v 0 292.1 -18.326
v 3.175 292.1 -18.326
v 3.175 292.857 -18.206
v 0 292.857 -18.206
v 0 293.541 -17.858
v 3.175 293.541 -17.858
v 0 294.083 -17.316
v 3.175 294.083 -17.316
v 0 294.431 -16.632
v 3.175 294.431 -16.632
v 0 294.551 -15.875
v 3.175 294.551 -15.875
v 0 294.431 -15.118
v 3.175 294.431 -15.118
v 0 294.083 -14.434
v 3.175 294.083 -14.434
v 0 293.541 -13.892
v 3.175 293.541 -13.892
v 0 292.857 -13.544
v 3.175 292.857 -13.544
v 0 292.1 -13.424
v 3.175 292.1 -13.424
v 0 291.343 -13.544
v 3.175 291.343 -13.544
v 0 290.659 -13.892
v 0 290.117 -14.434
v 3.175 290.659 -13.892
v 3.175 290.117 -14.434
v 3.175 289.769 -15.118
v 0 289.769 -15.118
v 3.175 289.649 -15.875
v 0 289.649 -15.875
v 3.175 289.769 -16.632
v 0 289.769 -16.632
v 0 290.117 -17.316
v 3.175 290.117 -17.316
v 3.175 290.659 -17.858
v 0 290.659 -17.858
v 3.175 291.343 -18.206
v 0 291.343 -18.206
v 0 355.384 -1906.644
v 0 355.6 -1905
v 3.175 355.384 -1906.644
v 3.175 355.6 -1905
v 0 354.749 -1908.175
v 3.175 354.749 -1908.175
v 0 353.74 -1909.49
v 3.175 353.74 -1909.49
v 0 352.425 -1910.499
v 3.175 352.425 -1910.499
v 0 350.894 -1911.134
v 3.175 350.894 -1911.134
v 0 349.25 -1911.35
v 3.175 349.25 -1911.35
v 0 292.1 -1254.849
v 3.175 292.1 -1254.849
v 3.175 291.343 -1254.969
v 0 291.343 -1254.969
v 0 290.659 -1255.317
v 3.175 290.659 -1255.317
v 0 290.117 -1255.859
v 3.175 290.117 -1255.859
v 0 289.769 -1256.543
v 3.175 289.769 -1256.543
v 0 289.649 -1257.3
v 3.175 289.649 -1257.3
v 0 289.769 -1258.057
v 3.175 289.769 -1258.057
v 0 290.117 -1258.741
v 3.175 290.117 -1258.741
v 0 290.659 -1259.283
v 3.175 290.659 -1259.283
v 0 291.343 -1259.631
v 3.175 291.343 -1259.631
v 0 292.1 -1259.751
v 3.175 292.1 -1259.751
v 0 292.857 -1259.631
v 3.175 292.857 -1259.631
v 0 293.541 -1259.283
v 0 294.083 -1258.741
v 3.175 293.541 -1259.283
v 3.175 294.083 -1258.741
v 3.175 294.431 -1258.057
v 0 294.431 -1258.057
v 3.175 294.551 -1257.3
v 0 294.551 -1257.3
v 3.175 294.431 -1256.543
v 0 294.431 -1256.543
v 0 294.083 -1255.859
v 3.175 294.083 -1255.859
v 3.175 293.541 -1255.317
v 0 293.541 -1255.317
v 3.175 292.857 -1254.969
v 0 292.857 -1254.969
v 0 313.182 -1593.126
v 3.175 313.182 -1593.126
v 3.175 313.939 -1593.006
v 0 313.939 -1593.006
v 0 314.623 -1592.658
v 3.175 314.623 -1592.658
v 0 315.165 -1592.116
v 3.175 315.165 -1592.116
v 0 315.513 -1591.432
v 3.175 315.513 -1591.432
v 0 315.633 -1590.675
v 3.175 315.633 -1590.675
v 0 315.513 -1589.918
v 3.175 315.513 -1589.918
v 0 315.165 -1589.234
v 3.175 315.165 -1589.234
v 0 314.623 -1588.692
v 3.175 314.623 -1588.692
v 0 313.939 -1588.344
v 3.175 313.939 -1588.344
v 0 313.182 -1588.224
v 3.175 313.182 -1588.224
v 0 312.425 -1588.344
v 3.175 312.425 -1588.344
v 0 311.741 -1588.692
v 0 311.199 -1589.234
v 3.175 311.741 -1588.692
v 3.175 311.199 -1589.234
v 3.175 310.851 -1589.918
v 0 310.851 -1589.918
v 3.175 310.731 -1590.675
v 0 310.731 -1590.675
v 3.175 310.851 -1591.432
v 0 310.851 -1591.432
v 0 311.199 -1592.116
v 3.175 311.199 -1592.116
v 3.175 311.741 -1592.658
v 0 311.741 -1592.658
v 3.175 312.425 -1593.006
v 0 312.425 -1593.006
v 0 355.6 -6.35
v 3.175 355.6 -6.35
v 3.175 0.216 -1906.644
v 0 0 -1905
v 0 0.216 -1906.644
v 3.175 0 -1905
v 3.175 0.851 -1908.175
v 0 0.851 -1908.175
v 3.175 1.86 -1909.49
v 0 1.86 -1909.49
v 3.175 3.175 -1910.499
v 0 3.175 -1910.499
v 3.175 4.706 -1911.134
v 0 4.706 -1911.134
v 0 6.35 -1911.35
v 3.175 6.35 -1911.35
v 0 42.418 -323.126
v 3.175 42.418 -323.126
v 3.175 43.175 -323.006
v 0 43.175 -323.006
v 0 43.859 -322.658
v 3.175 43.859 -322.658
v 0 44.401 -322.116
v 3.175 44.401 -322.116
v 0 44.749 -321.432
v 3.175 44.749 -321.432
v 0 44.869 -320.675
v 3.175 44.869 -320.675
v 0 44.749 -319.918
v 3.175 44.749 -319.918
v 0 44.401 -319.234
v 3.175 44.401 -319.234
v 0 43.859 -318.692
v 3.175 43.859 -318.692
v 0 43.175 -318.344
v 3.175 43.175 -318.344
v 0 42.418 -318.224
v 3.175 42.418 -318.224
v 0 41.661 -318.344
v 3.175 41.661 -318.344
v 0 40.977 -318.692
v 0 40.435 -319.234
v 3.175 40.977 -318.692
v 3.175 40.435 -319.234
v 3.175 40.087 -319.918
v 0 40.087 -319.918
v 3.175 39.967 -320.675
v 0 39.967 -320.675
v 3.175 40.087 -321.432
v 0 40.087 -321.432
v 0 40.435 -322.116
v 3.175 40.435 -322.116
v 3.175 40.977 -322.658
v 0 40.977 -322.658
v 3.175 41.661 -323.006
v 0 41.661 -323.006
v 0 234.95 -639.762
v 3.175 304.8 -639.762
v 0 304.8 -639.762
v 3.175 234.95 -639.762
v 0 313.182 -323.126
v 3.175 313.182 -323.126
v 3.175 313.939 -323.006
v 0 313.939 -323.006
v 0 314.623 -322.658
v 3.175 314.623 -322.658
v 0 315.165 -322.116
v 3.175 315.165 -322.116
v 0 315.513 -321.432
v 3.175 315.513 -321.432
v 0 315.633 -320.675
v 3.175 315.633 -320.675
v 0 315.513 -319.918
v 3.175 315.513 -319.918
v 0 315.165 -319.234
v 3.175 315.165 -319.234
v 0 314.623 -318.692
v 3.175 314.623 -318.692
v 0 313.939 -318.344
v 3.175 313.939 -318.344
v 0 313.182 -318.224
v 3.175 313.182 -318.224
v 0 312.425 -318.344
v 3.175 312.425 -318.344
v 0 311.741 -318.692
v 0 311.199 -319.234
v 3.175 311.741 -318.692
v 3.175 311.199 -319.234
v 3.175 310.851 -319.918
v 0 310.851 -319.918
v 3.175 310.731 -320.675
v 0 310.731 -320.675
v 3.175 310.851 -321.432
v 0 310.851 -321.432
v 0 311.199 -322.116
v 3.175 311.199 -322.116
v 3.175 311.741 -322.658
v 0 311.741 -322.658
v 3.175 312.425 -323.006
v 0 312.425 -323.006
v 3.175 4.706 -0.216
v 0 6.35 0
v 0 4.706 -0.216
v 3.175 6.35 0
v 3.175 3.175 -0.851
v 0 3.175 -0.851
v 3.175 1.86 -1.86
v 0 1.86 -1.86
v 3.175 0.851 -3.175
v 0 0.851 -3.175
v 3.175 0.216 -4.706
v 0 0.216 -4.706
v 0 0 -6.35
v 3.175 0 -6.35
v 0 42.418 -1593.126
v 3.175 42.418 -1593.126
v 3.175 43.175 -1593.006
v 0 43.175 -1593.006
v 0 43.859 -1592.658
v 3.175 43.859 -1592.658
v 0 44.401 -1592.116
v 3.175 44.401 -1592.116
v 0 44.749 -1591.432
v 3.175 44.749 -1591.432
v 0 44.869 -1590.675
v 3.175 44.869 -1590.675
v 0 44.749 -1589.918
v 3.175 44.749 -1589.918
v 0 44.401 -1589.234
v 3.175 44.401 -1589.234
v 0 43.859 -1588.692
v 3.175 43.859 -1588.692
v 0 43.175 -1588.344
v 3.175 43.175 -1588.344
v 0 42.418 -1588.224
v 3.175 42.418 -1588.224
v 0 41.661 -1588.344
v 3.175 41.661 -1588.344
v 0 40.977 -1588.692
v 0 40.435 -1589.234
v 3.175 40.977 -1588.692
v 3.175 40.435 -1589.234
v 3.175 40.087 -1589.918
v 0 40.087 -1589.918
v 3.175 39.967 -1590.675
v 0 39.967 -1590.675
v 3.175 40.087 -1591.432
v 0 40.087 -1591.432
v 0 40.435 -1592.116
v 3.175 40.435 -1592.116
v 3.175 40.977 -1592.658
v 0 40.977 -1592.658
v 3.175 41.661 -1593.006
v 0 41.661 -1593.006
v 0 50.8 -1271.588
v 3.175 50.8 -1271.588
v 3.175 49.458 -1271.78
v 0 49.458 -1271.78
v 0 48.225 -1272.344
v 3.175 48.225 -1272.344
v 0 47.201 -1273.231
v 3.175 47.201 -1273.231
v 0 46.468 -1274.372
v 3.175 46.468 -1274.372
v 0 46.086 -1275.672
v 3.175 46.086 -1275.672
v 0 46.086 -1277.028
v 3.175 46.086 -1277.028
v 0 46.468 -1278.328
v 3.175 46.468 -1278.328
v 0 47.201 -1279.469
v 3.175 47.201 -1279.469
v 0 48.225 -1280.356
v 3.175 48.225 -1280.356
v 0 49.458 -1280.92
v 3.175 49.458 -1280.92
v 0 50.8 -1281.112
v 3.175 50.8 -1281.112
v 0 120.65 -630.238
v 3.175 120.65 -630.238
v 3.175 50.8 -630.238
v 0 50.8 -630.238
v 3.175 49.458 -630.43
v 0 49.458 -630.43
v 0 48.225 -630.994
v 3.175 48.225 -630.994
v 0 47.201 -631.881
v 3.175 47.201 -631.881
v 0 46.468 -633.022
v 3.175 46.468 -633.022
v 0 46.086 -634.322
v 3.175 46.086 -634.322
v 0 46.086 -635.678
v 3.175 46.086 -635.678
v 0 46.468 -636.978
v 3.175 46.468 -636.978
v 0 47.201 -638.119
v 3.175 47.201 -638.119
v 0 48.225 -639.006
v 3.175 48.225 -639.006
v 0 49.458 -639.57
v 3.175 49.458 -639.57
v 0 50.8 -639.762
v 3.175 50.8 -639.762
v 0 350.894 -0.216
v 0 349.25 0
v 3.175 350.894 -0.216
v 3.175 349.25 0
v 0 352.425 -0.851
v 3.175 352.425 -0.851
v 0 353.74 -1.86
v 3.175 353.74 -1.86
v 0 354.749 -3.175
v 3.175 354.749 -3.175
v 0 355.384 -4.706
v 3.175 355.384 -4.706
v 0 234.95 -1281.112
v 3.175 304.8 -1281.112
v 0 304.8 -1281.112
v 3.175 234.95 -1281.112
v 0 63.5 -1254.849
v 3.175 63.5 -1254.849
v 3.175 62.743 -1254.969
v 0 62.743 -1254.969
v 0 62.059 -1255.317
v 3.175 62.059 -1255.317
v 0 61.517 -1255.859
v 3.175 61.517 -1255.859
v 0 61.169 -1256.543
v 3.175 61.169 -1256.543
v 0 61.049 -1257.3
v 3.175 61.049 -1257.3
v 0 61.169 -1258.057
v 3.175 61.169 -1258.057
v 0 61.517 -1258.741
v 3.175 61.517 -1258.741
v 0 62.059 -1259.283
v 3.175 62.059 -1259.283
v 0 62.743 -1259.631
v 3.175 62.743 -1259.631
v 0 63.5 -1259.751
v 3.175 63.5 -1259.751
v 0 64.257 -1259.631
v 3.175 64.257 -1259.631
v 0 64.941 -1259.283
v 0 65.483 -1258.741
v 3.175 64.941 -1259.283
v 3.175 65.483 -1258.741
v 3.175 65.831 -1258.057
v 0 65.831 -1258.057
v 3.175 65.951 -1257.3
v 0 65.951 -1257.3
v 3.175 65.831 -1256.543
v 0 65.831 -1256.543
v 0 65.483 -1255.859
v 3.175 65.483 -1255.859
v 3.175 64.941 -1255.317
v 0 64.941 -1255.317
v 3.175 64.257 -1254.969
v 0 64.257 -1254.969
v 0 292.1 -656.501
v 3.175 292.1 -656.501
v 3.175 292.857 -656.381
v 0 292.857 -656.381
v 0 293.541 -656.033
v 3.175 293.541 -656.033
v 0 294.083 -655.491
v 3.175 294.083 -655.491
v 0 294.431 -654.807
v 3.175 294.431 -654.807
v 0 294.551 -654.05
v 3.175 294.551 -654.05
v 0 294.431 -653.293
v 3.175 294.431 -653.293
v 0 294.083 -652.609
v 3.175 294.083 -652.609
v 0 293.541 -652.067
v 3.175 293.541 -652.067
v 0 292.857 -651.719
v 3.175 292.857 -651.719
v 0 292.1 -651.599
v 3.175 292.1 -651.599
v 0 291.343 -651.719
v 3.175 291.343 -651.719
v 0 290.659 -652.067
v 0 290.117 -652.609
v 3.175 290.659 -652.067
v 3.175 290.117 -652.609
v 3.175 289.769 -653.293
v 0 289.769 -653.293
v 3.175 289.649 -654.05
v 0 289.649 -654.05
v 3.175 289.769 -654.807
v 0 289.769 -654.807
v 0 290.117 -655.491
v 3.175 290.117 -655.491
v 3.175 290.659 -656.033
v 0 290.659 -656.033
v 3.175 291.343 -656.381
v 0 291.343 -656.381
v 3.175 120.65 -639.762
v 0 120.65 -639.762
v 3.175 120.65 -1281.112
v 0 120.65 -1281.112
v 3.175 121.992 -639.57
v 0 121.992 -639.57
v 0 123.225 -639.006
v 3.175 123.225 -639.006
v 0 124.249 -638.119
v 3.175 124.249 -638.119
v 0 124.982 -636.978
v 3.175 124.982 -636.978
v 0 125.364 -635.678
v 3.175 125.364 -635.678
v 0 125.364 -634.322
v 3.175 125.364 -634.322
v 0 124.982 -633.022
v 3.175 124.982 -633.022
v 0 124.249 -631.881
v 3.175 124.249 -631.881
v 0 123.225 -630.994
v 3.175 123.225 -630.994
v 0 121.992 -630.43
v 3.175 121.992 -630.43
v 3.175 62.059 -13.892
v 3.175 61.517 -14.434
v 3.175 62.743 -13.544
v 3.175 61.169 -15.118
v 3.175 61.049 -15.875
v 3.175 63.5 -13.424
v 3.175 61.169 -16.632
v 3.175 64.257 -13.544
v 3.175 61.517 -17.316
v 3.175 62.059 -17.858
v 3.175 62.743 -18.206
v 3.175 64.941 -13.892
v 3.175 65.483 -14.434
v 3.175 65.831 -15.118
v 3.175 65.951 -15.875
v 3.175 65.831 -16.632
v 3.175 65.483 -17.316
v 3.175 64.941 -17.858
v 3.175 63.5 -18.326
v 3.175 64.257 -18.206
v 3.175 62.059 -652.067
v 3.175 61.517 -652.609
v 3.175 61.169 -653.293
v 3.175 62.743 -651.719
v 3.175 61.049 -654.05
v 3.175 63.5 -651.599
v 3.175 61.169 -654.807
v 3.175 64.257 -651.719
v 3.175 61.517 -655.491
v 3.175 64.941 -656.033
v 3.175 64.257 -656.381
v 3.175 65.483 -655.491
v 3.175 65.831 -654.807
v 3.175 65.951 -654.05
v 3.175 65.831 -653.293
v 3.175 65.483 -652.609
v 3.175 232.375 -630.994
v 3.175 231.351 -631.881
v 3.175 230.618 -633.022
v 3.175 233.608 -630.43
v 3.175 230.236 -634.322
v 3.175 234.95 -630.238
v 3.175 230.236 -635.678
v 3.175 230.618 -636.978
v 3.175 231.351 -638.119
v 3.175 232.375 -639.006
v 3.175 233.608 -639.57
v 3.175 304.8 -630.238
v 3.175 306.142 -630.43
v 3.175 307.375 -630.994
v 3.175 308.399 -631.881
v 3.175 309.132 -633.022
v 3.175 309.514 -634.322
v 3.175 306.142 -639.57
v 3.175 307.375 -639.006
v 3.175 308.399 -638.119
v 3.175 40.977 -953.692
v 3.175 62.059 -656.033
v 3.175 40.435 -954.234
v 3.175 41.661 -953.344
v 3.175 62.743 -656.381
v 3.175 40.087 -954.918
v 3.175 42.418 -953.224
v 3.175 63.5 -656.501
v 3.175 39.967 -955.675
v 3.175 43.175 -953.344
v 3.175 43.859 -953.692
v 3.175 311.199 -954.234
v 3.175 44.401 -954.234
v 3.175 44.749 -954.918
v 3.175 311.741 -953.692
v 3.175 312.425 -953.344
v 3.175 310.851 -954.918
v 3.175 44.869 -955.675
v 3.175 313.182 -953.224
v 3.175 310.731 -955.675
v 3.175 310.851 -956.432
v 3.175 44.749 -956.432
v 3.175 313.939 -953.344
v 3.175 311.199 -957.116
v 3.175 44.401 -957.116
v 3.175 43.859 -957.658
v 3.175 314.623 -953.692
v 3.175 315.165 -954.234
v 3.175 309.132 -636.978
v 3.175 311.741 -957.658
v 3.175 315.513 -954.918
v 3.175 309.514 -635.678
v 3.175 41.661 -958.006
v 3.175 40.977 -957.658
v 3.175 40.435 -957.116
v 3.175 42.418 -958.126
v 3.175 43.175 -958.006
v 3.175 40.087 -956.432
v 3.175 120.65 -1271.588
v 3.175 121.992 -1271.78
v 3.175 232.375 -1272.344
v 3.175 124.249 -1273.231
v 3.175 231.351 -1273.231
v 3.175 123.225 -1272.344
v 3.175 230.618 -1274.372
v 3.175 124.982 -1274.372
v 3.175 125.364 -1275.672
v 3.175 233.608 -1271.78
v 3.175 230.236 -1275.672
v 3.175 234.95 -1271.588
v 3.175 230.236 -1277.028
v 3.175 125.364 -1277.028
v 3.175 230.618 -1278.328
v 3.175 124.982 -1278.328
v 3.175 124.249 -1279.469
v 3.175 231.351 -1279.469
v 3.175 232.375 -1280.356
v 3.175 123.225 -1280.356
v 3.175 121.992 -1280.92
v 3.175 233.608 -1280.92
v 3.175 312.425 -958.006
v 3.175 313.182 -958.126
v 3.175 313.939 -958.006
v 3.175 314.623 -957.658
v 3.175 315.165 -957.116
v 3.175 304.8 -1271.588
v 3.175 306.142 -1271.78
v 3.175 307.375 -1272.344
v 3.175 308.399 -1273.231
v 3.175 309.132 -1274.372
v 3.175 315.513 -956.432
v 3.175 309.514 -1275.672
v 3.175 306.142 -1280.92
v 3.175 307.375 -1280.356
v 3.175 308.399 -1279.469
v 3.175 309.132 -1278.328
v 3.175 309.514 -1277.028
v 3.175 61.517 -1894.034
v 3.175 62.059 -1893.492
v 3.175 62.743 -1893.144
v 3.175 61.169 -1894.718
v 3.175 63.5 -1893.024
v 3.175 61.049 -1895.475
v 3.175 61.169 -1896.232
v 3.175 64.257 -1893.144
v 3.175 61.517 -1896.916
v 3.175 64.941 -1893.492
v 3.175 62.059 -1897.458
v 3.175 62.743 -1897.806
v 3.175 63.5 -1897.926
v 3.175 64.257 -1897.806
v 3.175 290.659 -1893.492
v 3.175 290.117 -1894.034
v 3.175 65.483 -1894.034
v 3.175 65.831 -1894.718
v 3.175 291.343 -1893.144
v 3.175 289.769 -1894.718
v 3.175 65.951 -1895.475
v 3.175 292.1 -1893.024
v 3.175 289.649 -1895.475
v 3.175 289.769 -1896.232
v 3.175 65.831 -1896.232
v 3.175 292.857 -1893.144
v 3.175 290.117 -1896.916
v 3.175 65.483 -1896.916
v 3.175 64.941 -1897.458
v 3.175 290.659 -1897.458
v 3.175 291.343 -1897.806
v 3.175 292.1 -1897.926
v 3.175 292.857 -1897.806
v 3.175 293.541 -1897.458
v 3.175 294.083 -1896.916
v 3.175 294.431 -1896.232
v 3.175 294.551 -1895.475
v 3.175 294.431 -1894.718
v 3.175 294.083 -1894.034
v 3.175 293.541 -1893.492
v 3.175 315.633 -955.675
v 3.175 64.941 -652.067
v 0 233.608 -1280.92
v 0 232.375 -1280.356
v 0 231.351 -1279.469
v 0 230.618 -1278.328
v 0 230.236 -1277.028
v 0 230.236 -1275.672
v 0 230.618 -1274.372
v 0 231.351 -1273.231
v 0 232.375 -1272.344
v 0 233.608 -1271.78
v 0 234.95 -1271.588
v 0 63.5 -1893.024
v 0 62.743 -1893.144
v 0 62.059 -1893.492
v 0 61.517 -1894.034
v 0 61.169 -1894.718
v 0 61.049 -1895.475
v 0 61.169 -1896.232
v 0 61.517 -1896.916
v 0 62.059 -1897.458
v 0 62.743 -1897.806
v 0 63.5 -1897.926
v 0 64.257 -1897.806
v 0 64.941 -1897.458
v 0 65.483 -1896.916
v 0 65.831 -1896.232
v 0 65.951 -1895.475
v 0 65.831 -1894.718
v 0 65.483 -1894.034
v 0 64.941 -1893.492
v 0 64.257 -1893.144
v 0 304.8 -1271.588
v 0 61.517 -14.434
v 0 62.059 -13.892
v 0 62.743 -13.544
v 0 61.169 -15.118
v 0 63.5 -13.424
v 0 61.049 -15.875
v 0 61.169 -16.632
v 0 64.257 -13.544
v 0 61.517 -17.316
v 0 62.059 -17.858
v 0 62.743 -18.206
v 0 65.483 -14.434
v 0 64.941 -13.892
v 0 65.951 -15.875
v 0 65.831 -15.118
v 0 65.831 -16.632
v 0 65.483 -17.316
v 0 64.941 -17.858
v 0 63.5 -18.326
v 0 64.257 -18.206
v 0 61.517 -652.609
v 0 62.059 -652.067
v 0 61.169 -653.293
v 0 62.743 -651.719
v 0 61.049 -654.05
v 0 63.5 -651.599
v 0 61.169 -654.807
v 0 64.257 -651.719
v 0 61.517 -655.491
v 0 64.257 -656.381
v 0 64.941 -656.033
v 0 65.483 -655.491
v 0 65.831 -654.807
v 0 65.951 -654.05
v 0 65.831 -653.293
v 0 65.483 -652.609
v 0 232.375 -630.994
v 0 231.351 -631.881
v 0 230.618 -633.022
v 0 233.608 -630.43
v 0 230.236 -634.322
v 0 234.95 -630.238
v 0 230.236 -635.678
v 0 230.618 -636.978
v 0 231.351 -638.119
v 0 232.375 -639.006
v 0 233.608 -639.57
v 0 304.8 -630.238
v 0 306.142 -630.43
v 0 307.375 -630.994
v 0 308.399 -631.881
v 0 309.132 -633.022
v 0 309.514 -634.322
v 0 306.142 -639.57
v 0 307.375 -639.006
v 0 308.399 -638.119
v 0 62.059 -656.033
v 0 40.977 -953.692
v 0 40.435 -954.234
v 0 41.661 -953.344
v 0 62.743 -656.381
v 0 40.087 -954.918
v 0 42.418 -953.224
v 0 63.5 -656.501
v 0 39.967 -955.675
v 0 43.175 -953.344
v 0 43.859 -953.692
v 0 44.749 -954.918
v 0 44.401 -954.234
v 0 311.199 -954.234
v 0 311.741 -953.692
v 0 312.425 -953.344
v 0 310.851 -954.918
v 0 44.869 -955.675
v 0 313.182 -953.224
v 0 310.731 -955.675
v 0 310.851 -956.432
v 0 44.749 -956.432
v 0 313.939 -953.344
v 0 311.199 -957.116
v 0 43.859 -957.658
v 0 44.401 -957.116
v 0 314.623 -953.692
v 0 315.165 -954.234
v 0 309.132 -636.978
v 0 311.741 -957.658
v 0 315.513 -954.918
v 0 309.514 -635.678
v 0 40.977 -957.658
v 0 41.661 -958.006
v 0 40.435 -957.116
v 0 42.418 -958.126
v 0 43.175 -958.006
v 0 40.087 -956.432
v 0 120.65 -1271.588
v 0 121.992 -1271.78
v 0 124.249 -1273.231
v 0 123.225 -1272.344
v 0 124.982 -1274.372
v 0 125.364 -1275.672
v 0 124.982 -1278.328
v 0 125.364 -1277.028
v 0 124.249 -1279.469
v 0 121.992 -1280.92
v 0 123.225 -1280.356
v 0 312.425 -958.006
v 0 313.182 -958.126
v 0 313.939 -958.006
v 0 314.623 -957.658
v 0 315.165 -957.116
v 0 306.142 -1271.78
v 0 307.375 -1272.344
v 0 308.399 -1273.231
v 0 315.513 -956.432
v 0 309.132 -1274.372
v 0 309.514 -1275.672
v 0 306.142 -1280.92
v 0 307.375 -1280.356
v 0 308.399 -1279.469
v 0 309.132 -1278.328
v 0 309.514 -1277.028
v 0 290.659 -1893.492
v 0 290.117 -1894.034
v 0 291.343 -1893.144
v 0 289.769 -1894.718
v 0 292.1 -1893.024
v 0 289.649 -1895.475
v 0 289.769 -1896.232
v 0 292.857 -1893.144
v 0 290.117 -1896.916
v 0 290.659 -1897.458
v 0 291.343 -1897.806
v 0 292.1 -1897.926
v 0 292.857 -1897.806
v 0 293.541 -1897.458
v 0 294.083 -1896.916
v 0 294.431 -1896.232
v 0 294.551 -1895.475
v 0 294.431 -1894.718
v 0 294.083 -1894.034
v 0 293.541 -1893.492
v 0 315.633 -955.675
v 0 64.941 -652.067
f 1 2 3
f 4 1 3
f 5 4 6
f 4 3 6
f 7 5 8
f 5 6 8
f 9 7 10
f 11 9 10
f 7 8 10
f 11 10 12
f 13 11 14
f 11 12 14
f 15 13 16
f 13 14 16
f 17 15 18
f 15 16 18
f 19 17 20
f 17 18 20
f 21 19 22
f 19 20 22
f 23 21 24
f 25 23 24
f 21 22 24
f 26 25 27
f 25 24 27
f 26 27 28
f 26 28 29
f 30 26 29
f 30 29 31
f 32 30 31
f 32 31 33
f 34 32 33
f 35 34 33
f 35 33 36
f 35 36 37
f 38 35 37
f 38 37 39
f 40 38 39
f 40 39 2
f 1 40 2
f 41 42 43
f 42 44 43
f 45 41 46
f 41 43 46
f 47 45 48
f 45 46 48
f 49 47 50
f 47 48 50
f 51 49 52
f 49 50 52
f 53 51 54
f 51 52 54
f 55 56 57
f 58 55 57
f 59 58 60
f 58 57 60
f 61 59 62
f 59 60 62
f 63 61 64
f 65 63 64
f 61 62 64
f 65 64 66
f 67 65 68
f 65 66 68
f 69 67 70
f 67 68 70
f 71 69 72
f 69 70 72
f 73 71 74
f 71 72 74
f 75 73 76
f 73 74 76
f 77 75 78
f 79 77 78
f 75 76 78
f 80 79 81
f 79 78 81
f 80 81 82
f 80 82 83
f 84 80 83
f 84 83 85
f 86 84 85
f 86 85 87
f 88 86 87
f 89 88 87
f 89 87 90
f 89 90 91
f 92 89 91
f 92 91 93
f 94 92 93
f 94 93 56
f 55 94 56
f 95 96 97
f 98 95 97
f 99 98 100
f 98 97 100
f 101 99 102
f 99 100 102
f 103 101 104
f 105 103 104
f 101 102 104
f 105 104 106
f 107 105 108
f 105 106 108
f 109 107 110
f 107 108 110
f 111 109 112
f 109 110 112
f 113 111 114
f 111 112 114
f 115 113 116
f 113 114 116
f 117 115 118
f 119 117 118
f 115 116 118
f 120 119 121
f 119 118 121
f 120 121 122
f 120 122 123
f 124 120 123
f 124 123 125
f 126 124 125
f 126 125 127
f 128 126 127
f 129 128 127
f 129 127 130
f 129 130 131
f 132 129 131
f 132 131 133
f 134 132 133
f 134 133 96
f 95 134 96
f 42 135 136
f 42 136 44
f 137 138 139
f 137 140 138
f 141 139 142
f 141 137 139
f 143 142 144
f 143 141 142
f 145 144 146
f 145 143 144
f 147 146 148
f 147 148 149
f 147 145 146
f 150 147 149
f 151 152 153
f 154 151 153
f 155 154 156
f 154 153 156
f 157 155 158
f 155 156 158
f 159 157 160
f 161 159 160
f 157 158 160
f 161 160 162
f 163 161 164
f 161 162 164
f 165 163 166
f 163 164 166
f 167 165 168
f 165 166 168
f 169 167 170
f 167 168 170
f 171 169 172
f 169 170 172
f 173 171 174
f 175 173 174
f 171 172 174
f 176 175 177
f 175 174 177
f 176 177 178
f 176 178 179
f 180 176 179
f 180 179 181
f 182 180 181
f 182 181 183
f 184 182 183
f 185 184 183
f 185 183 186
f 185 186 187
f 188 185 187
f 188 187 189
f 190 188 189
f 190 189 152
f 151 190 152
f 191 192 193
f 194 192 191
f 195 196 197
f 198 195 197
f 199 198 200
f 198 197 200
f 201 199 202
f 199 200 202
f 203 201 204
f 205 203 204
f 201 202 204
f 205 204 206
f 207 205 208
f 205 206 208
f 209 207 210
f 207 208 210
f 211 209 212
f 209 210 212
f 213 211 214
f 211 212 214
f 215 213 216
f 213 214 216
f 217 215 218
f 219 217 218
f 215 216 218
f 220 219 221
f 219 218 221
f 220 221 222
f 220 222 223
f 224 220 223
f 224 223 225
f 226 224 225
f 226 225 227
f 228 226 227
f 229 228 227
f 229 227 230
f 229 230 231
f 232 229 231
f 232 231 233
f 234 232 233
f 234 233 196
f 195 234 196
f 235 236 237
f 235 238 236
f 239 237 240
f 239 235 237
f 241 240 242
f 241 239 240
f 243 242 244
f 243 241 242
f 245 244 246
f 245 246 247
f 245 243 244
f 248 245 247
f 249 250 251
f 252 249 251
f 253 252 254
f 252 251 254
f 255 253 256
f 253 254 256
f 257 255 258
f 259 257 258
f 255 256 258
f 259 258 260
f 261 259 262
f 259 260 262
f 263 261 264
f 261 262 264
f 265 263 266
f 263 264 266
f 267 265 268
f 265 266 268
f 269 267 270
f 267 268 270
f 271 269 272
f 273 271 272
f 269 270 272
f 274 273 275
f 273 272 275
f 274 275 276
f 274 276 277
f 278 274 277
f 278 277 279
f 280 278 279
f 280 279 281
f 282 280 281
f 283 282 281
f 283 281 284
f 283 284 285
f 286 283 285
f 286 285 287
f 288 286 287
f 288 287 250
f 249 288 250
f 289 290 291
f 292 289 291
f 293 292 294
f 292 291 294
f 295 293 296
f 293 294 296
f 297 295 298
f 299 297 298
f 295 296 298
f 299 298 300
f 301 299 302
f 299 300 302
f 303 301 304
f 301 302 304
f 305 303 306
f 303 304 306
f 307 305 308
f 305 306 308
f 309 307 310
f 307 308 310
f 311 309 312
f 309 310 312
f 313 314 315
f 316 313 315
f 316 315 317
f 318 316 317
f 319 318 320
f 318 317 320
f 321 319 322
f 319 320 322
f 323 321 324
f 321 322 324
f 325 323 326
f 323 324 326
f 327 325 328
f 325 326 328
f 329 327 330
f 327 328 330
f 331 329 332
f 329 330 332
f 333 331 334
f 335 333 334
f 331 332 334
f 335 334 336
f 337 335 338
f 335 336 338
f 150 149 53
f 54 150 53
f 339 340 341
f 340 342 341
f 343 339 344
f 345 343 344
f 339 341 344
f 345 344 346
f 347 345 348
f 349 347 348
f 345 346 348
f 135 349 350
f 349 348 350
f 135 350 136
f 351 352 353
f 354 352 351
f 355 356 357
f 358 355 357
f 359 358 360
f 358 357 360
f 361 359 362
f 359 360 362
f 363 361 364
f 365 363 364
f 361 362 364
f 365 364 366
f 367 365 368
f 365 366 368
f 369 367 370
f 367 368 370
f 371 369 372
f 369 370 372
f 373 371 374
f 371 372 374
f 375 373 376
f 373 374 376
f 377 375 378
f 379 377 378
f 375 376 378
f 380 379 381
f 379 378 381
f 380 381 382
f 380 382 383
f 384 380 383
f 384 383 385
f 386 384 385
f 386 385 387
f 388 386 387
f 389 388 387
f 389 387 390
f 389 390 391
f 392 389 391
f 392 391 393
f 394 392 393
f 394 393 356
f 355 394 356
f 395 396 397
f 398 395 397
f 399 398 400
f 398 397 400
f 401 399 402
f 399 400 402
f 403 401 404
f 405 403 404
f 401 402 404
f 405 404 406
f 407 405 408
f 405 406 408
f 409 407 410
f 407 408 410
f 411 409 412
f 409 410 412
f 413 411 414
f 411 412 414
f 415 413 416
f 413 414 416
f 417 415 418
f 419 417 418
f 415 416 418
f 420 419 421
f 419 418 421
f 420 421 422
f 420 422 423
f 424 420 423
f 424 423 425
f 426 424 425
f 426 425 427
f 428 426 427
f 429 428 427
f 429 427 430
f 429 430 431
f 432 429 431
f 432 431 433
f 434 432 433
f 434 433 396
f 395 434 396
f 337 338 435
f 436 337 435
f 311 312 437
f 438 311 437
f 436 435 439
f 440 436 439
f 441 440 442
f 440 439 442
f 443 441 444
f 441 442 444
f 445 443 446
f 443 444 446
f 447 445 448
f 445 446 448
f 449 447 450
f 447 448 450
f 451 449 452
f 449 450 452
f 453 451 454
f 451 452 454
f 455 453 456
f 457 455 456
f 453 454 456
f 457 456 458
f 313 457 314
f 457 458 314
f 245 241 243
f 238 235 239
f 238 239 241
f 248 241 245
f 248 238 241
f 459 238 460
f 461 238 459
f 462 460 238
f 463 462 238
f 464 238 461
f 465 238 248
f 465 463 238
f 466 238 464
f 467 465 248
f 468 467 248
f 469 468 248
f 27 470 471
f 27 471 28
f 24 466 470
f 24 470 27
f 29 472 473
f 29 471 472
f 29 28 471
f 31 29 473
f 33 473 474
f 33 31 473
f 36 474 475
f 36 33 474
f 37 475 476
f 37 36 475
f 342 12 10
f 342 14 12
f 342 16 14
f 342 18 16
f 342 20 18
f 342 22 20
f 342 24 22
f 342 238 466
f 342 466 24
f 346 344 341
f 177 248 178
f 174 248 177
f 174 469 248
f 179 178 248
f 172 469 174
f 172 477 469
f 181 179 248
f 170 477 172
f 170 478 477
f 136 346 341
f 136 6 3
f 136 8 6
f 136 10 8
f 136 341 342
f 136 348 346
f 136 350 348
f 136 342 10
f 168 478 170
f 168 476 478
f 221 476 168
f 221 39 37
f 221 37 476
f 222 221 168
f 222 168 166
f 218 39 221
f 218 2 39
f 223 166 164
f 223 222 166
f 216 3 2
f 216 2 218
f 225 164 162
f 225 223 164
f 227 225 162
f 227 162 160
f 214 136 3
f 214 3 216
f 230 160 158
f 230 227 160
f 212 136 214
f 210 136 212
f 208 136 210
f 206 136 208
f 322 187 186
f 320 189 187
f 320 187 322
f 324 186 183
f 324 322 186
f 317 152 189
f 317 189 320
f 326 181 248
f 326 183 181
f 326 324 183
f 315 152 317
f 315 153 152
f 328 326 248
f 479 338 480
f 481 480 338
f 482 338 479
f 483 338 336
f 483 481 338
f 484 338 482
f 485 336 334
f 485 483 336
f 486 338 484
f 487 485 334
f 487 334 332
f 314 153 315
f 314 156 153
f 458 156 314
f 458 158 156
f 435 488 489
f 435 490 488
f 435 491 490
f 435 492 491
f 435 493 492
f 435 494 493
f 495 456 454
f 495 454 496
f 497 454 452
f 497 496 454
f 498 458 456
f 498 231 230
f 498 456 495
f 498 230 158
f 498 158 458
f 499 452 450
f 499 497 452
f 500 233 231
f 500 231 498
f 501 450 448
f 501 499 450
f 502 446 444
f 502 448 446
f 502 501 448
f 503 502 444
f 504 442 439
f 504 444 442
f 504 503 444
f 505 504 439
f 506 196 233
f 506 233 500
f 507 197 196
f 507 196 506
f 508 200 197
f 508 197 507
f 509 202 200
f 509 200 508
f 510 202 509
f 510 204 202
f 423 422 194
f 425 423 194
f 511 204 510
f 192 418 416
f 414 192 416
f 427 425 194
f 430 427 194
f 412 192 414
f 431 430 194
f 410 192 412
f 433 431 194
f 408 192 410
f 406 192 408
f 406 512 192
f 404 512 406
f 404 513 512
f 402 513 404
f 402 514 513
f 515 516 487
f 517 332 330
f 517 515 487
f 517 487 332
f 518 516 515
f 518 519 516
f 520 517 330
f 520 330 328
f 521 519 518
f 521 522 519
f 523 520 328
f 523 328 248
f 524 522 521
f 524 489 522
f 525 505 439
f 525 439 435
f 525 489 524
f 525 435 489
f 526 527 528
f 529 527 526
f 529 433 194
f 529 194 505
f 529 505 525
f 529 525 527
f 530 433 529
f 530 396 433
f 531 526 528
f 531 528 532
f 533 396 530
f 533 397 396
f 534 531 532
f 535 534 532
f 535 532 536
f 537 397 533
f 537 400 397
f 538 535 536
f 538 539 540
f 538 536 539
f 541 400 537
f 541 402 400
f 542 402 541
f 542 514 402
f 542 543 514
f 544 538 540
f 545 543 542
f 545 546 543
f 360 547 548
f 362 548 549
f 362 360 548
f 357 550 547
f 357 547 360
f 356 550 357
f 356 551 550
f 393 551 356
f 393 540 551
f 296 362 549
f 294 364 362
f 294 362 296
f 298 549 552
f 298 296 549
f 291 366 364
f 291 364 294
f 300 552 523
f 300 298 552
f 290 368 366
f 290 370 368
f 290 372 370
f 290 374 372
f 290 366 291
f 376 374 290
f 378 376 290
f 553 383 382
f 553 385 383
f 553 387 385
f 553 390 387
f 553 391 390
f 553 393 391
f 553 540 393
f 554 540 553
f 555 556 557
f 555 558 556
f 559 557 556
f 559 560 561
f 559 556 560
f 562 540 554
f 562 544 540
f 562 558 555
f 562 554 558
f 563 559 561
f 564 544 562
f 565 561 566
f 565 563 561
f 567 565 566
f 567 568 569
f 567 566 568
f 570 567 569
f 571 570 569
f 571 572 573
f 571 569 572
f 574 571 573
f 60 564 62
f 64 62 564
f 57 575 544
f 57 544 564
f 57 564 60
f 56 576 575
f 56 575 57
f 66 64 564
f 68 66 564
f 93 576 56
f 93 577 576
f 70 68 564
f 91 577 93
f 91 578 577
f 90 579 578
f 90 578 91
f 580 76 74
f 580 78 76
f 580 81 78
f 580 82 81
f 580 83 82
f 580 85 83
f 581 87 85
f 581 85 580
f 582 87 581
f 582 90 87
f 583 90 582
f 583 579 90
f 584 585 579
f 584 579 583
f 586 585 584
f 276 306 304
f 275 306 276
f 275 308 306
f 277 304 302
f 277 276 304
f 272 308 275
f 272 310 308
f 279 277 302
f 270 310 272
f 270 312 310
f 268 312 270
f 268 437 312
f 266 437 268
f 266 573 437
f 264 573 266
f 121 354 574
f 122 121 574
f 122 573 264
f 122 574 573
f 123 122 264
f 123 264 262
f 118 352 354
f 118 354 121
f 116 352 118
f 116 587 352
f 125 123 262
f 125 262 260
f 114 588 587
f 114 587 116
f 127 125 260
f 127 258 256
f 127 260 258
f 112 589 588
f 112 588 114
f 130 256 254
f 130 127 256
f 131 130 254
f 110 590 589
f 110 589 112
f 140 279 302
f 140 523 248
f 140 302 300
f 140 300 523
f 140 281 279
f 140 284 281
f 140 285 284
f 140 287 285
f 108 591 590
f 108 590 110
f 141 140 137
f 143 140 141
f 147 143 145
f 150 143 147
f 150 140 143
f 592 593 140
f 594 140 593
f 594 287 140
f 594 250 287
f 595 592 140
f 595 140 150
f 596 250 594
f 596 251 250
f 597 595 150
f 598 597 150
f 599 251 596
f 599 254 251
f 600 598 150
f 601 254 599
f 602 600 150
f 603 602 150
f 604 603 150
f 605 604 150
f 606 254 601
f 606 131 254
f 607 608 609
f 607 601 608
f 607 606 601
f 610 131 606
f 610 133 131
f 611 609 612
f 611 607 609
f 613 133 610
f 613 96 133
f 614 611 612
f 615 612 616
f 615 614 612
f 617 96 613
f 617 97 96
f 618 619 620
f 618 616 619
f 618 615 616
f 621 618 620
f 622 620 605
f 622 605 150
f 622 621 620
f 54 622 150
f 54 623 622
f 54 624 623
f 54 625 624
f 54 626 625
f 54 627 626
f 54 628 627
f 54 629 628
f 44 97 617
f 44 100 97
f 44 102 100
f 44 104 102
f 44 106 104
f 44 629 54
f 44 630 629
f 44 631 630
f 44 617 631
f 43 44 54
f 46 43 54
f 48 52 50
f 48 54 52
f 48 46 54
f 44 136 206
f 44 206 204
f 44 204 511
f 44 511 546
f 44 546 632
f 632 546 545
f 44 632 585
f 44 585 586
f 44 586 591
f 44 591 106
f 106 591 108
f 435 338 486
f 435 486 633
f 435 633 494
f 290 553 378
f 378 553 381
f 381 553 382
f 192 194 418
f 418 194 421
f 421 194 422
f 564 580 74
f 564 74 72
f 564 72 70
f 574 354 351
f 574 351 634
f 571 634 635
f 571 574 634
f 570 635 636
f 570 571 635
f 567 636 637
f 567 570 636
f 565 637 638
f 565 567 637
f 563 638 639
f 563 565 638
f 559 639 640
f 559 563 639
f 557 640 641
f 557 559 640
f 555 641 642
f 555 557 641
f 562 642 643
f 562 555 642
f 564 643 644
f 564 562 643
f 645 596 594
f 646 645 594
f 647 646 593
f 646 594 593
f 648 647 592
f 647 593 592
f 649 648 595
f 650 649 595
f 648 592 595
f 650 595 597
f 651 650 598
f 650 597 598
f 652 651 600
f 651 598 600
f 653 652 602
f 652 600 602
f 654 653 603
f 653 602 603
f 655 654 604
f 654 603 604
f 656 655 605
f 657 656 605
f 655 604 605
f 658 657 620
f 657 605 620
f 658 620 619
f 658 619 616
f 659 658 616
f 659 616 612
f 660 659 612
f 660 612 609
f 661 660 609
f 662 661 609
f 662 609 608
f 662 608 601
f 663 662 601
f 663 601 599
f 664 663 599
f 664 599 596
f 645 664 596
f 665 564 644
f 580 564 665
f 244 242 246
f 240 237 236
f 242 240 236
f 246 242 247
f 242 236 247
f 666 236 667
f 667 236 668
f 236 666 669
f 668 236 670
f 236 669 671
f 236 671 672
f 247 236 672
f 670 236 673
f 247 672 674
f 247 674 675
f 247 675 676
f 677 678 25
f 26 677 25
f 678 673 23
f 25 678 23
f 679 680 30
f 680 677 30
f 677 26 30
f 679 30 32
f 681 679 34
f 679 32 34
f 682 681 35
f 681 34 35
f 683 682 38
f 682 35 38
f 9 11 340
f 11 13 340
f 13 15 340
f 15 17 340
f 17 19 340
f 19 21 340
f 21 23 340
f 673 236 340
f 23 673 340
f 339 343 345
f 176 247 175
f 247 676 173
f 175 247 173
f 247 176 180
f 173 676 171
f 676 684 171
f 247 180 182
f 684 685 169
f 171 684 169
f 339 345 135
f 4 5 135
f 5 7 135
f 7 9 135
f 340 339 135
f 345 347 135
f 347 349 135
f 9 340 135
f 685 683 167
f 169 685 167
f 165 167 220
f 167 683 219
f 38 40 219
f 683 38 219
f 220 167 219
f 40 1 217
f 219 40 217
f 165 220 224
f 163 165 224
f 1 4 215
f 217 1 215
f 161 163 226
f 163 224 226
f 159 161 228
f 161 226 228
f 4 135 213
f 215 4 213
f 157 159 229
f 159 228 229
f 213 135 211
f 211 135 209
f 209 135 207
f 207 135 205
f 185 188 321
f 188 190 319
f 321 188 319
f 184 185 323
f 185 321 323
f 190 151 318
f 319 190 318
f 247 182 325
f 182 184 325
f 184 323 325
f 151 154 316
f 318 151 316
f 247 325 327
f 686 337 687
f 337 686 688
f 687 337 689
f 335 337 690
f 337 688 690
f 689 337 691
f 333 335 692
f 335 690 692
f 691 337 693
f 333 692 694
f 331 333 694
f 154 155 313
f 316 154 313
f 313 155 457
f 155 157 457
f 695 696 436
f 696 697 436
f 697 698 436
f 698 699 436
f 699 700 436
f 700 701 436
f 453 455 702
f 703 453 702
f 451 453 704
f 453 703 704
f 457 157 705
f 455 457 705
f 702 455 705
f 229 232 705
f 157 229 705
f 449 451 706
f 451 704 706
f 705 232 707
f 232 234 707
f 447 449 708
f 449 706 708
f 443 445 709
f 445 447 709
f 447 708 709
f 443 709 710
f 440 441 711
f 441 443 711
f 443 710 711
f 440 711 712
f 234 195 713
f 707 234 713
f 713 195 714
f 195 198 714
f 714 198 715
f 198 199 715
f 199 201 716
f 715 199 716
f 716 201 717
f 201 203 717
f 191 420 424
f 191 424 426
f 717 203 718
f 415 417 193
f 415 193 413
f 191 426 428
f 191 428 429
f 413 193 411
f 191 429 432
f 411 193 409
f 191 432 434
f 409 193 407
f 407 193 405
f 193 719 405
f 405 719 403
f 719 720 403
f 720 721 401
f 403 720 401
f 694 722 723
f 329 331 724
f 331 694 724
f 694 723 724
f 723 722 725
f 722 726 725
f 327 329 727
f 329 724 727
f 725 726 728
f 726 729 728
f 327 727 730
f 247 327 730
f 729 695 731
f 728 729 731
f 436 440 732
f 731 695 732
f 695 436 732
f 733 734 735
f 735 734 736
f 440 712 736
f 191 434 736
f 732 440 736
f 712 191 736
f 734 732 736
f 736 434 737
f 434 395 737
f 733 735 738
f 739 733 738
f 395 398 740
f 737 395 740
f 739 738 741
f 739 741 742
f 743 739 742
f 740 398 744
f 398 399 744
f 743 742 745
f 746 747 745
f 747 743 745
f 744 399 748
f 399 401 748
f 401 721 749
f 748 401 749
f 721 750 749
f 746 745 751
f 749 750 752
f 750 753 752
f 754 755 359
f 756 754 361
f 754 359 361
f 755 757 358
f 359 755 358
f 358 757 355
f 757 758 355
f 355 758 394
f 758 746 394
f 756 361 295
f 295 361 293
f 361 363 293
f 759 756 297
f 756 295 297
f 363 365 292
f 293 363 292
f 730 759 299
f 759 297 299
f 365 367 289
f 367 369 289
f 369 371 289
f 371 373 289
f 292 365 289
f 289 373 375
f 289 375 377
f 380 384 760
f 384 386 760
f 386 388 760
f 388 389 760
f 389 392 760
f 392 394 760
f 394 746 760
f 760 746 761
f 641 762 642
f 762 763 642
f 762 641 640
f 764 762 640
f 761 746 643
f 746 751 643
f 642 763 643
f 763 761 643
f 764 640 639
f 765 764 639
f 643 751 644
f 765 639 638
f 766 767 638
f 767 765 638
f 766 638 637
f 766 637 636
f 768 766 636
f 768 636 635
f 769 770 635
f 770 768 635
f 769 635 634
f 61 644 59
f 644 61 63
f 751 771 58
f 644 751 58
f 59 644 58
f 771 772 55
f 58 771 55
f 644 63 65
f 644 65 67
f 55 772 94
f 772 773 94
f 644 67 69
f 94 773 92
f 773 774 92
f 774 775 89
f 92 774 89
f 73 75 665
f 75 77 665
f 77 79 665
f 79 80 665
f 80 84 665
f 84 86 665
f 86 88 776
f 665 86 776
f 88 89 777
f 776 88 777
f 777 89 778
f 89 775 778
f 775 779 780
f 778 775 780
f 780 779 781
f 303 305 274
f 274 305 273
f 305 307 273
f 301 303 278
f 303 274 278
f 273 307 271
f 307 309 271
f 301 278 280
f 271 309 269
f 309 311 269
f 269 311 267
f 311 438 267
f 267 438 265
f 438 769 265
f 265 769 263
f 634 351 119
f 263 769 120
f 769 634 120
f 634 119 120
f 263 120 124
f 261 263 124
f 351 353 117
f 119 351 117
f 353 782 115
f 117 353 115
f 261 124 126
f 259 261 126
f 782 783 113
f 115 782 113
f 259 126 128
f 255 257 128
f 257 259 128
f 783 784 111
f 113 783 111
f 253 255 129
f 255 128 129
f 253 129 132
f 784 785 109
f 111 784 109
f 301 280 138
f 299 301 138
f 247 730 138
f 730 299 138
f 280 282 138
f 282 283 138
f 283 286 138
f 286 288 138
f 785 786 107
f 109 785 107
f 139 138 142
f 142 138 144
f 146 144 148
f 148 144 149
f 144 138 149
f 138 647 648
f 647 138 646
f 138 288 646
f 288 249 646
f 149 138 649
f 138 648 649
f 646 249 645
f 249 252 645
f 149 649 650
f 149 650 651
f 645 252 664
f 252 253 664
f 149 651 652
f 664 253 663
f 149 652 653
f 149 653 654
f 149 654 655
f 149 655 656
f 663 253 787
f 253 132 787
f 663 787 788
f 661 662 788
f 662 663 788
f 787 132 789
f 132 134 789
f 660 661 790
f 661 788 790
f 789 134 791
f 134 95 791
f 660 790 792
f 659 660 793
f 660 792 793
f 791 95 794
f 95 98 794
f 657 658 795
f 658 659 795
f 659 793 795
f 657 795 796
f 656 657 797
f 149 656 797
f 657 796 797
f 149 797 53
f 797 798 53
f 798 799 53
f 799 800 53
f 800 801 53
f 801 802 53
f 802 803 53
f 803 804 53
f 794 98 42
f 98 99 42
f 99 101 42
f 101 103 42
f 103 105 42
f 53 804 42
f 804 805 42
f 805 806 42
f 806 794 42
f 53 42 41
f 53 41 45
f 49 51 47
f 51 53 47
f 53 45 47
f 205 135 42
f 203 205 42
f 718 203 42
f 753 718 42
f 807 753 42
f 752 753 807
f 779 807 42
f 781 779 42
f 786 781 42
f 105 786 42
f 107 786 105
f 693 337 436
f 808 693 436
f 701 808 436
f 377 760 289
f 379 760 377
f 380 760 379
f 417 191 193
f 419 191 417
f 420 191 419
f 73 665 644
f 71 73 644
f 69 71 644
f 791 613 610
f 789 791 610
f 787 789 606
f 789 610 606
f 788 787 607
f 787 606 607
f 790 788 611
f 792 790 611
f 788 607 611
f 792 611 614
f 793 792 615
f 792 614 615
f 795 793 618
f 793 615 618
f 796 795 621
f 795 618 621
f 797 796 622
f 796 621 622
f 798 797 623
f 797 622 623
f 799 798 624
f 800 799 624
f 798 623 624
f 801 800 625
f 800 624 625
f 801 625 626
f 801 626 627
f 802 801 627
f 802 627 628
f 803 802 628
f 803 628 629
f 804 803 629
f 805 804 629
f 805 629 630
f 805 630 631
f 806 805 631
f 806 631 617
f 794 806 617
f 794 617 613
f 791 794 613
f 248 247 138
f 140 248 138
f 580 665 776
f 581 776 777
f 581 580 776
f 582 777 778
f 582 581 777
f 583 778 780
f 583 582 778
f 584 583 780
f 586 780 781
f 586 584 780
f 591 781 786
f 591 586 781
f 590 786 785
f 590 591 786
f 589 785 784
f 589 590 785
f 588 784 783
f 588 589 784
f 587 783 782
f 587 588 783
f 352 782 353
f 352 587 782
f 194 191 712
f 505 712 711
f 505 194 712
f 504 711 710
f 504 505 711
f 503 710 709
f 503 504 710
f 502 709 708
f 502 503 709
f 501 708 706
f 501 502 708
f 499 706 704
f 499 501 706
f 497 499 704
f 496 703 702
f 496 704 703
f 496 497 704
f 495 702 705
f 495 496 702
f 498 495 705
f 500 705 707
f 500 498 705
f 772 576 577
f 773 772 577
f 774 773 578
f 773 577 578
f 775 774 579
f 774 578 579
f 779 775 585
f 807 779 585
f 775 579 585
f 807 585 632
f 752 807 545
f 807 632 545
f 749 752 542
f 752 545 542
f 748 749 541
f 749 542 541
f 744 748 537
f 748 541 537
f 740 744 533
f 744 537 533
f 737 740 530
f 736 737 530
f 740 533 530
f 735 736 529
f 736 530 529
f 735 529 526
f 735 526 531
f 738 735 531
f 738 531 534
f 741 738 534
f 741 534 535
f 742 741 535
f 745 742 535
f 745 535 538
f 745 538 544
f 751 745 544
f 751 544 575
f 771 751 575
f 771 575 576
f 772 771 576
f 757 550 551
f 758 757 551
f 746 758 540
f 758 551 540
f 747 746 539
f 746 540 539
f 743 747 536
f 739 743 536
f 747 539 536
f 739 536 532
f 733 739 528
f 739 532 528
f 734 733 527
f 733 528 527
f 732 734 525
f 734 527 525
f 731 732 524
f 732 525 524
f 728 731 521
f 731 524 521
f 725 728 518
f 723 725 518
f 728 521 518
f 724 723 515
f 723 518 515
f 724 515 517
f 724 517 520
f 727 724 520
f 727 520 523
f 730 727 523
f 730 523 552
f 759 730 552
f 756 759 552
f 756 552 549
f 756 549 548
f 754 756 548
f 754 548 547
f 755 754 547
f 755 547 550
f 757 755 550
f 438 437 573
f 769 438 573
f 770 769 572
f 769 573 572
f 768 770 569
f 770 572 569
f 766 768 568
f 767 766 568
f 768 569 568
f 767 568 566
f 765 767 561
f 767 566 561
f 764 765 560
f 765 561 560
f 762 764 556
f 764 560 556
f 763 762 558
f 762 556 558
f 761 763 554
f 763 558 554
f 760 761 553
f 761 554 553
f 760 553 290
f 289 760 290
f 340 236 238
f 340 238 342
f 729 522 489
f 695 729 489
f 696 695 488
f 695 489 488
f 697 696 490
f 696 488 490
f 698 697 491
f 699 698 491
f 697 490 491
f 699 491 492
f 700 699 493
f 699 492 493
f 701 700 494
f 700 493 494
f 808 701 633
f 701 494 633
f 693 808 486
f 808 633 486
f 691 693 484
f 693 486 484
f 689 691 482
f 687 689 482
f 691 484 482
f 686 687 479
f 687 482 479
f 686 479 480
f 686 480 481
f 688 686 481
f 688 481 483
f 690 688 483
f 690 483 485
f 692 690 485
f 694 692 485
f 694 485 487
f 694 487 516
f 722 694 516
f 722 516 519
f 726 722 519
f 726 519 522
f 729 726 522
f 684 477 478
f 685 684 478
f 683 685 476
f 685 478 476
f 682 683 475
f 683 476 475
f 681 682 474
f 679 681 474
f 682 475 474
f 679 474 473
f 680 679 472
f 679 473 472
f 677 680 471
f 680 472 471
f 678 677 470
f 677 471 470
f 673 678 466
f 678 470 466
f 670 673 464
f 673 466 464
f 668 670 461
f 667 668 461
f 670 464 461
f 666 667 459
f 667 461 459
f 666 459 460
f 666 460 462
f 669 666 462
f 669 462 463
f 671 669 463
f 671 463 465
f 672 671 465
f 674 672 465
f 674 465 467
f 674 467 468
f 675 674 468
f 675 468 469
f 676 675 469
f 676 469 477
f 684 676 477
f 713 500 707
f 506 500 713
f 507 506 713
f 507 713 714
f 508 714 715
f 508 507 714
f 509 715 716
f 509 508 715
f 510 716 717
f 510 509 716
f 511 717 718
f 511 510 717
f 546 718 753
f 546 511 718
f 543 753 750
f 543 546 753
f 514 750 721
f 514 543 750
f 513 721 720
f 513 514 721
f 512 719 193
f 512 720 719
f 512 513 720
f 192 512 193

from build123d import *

# Parameters (mm, degrees)
SKETCH1_W           = 1911.35
SKETCH1_H           = 355.6
BOSS_EXTRUDE1_DEPTH = 3.175
SKETCH2_R           = 2.4511
CUT_EXTRUDE1_DEPTH  = 1945.15026763
FILLET1_R           = 6.35
CUT_EXTRUDE2_DEPTH  = 1945.15026763


with BuildPart() as part:
    # Sketch1 → Boss-Extrude1 (new body)
    with BuildSketch(Plane(origin=(0, 0, 0), x_dir=(0, 0, -1), z_dir=(1, 0, 0))):
        with Locations((955.675, 177.8)):
            Rectangle(SKETCH1_W, SKETCH1_H)
    extrude(amount=BOSS_EXTRUDE1_DEPTH)

    # Sketch2 → Cut-Extrude1 (cut, through all)
    with BuildSketch(Plane(origin=(3.175, 0, 0), x_dir=(0, 0, -1), z_dir=(1, 0, 0))):
        with Locations((15.875, 292.1)):
            Circle(SKETCH2_R)
        with Locations((654.05, 292.1)):
            Circle(SKETCH2_R)
        with Locations((320.675, 313.182)):
            Circle(SKETCH2_R)
        with Locations((955.675, 313.182)):
            Circle(SKETCH2_R)
        with Locations((1590.675, 313.182)):
            Circle(SKETCH2_R)
        with Locations((955.675, 42.418)):
            Circle(SKETCH2_R)
        with Locations((1590.675, 42.418)):
            Circle(SKETCH2_R)
        with Locations((320.675, 42.418)):
            Circle(SKETCH2_R)
        with Locations((15.875, 63.5)):
            Circle(SKETCH2_R)
        with Locations((654.05, 63.5)):
            Circle(SKETCH2_R)
        with Locations(Location((1895.475, 63.5, 0), (0, 0, 180))):
            Circle(SKETCH2_R)
        with Locations(Location((1895.475, 292.1, 0), (0, 0, 180))):
            Circle(SKETCH2_R)
        with Locations(Location((1257.3, 63.5, 0), (0, 0, 180))):
            Circle(SKETCH2_R)
        with Locations(Location((1257.3, 292.1, 0), (0, 0, 180))):
            Circle(SKETCH2_R)
    extrude(amount=-CUT_EXTRUDE1_DEPTH, mode=Mode.SUBTRACT)

    # Fillet1
    fillet1_edges = [part.edges().sort_by_distance(p)[0] for p in [
        (1.5875, 355.6, 0),
        (1.5875, 355.6, -1911.35),
        (1.5875, 0, -1911.35),
        (1.5875, 0, 0),
    ]]
    fillet(fillet1_edges, radius=FILLET1_R)

    # Sketch3 → Cut-Extrude2 (cut, through all)
    with BuildSketch(Plane(origin=(3.175, 0, 0), x_dir=(0, 0, -1), z_dir=(1, 0, 0))):
        with BuildLine():
            Line((639.7625, 304.8), (639.7625, 234.95))
            ThreePointArc((639.7625, 234.95), (635, 230.1875), (630.2375, 234.95))
            Line((630.2375, 234.95), (630.2375, 304.8))
            ThreePointArc((630.2375, 304.8), (635, 309.5625), (639.7625, 304.8))
        make_face()
        with BuildLine():
            Line((1281.1125, 304.8), (1281.1125, 234.95))
            ThreePointArc((1281.1125, 234.95), (1276.35, 230.1875), (1271.5875, 234.95))
            Line((1271.5875, 234.95), (1271.5875, 304.8))
            ThreePointArc((1271.5875, 304.8), (1276.35, 309.5625), (1281.1125, 304.8))
        make_face()
        with BuildLine():
            Line((1281.1125, 50.8), (1281.1125, 120.65))
            ThreePointArc((1281.1125, 120.65), (1276.35, 125.4125), (1271.5875, 120.65))
            Line((1271.5875, 120.65), (1271.5875, 50.8))
            ThreePointArc((1271.5875, 50.8), (1276.35, 46.0375), (1281.1125, 50.8))
        make_face()
        with BuildLine():
            Line((639.7625, 50.8), (639.7625, 120.65))
            ThreePointArc((639.7625, 120.65), (635, 125.4125), (630.2375, 120.65))
            Line((630.2375, 120.65), (630.2375, 50.8))
            ThreePointArc((630.2375, 50.8), (635, 46.0375), (639.7625, 50.8))
        make_face()
    extrude(amount=-CUT_EXTRUDE2_DEPTH, mode=Mode.SUBTRACT)


solid = part.part
